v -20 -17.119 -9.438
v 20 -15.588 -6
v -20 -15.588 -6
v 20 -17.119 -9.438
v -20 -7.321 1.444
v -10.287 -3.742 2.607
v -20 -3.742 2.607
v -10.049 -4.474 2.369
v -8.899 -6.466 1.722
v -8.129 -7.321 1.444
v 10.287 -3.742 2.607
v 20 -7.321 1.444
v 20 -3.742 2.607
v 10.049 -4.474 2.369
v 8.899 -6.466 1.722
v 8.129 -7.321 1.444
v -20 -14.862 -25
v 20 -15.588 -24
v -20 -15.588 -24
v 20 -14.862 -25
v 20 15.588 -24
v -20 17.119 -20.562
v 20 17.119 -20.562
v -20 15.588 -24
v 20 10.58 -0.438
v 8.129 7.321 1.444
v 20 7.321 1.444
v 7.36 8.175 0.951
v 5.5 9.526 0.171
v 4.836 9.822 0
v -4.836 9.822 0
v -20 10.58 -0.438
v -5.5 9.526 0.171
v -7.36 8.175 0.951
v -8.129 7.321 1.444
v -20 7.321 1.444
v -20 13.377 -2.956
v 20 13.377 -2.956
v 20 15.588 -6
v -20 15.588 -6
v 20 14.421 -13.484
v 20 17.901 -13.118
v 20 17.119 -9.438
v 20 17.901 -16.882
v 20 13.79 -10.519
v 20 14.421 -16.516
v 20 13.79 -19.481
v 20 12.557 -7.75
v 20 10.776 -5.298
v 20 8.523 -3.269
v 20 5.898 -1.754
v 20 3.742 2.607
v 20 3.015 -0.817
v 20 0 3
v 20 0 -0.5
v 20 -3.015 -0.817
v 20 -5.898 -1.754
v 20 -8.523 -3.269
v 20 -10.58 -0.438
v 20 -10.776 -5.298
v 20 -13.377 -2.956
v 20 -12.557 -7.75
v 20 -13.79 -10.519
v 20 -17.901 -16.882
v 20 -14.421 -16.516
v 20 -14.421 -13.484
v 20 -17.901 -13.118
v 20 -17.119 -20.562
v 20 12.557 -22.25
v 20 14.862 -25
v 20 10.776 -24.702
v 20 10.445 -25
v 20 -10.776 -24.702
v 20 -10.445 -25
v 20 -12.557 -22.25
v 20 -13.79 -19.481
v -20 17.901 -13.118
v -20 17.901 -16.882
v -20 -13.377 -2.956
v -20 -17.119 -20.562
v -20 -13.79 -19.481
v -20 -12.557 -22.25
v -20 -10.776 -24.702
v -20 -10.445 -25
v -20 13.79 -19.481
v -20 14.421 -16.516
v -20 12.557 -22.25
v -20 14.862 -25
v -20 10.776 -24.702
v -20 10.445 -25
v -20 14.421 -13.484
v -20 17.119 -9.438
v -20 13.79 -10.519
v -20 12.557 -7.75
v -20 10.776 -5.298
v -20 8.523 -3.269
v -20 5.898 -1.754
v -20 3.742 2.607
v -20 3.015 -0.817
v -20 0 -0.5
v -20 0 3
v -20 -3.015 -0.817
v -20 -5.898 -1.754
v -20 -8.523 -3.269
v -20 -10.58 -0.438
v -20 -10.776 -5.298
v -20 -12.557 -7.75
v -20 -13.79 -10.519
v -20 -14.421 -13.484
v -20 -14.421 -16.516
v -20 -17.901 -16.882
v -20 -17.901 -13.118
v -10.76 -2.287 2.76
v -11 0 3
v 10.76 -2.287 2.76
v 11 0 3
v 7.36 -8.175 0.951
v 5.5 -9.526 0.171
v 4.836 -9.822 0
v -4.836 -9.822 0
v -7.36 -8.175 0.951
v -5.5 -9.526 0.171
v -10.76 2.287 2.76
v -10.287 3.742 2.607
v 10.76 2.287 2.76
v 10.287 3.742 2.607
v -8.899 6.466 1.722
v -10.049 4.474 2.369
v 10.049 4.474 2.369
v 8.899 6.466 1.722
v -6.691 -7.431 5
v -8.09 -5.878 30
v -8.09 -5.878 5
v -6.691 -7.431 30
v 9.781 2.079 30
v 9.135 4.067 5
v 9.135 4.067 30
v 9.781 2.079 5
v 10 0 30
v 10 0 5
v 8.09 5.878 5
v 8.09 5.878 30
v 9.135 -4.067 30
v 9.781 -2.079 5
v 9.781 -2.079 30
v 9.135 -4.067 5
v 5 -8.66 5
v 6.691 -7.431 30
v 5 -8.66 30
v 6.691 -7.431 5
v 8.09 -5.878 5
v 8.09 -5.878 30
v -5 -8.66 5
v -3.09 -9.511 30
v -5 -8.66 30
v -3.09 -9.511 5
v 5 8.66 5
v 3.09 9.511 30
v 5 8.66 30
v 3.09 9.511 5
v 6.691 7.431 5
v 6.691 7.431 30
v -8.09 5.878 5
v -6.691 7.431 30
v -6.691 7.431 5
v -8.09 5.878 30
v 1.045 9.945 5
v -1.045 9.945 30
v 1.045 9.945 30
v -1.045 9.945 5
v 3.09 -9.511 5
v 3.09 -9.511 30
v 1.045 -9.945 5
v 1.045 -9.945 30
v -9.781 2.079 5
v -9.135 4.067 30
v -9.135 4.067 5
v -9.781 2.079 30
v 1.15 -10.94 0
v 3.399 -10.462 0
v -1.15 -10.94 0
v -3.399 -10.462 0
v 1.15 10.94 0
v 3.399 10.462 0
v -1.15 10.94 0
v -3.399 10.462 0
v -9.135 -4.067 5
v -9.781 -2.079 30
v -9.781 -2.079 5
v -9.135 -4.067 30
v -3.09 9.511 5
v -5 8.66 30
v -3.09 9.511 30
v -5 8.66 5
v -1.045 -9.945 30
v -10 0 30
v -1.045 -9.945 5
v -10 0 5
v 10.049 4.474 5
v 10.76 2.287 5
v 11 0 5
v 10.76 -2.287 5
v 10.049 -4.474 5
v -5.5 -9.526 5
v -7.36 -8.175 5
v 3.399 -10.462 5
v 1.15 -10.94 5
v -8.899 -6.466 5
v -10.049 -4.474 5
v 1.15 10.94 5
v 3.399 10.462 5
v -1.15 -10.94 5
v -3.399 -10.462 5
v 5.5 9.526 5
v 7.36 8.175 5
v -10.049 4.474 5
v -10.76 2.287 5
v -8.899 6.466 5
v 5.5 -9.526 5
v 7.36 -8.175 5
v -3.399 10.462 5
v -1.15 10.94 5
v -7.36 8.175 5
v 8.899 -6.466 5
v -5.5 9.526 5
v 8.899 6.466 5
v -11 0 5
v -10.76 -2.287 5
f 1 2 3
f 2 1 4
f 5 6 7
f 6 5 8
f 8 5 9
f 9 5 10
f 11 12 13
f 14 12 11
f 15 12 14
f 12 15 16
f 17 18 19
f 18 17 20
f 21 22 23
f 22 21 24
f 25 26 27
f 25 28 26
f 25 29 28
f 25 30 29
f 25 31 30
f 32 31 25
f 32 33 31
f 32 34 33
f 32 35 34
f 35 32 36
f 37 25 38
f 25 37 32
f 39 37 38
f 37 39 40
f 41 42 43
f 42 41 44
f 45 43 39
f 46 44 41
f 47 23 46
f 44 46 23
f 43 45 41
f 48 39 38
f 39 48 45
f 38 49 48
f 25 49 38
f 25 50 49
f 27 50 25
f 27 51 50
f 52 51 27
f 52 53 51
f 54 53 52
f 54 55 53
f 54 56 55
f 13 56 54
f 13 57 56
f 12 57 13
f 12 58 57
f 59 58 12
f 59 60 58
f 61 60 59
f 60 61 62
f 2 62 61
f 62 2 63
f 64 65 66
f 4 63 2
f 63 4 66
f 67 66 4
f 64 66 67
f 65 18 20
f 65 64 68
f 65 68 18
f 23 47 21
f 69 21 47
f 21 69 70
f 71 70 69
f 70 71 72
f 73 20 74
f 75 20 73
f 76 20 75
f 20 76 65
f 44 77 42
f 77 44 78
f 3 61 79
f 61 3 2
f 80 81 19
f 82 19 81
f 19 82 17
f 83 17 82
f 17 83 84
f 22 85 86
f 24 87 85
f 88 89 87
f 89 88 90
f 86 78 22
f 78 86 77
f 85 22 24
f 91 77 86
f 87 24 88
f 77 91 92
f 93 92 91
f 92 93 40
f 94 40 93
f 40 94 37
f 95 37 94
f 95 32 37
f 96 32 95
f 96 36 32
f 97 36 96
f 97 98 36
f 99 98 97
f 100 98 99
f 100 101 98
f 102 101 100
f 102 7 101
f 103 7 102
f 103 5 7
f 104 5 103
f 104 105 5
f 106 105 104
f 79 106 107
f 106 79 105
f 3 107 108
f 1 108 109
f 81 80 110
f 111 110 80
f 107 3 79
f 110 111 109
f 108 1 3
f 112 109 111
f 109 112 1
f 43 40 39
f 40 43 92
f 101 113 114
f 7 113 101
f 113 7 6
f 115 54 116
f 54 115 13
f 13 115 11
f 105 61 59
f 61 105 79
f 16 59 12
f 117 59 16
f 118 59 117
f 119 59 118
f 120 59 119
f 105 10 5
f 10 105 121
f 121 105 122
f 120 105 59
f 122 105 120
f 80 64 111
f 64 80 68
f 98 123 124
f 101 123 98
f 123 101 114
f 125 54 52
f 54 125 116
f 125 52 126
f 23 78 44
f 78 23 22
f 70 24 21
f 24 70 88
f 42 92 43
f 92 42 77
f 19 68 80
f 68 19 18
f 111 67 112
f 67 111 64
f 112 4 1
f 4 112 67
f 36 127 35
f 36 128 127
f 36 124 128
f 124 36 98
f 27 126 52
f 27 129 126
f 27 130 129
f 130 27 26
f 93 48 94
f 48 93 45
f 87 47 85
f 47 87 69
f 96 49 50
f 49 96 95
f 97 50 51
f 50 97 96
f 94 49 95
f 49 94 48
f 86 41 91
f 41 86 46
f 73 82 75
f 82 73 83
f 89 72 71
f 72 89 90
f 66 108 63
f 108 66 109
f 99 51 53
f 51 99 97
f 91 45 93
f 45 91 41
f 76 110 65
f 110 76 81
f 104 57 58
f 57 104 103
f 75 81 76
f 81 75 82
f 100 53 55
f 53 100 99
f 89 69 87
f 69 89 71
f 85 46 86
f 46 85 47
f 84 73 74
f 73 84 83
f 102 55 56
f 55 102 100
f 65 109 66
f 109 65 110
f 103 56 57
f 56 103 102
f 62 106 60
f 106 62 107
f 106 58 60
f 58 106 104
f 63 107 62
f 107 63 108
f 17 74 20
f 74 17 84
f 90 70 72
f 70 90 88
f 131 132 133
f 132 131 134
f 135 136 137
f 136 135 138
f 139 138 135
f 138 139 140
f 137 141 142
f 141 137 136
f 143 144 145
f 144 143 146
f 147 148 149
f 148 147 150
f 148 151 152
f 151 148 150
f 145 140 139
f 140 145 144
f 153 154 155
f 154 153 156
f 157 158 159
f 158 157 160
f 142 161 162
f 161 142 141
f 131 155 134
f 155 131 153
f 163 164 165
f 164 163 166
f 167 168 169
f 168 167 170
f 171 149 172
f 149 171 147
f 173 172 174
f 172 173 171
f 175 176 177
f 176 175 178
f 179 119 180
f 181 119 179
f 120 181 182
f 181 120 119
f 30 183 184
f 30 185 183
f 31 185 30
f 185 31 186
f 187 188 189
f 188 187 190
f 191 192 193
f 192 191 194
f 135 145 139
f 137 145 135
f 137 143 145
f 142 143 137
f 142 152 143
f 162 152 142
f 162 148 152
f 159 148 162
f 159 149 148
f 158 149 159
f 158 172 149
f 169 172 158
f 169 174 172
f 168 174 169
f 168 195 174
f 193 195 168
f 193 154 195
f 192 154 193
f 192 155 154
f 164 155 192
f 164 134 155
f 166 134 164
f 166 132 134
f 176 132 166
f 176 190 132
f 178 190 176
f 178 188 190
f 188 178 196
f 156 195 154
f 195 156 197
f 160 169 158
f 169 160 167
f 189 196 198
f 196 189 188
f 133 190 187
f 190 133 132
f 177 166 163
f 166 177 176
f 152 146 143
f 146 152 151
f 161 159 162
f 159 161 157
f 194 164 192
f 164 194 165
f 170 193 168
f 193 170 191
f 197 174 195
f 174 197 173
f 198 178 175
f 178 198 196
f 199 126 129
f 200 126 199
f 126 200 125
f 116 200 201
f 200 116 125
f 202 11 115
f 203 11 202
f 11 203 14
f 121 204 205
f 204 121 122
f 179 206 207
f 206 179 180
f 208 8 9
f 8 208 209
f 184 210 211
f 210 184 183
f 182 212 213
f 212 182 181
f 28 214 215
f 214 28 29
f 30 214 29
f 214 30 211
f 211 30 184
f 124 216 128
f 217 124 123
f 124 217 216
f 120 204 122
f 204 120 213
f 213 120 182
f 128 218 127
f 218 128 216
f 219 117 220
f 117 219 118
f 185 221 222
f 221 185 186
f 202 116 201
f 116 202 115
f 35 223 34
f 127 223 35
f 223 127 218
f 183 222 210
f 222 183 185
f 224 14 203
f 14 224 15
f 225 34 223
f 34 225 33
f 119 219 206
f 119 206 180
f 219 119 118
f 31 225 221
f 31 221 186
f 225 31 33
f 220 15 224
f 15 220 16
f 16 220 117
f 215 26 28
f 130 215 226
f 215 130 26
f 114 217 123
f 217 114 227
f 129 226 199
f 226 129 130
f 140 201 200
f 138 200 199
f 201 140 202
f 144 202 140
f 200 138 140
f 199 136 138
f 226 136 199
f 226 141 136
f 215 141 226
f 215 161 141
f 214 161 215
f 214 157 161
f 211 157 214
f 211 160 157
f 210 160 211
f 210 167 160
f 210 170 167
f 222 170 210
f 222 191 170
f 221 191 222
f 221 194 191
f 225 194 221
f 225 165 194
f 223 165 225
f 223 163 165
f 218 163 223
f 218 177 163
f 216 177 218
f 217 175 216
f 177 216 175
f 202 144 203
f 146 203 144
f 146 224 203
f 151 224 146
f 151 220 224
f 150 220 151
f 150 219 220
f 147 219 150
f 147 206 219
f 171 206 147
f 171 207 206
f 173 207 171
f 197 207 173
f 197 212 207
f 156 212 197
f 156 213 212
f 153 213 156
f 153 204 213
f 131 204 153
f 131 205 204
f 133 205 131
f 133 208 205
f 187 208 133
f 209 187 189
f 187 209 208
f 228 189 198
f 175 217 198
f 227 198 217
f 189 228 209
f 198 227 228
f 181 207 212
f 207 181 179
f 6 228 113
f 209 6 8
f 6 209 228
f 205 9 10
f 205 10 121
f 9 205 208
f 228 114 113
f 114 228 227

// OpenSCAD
cylinder(30,10,10);
cylinder(5,11,11);
difference(){
  translate([0,0,-15]) rotate([0,90,0]) difference(){    
    cylinder(40,18,18,true);
    cylinder(43,14.5,14.5,true);
  }
  translate([0,0,-35]) cube([60,60,20], true);  
}
